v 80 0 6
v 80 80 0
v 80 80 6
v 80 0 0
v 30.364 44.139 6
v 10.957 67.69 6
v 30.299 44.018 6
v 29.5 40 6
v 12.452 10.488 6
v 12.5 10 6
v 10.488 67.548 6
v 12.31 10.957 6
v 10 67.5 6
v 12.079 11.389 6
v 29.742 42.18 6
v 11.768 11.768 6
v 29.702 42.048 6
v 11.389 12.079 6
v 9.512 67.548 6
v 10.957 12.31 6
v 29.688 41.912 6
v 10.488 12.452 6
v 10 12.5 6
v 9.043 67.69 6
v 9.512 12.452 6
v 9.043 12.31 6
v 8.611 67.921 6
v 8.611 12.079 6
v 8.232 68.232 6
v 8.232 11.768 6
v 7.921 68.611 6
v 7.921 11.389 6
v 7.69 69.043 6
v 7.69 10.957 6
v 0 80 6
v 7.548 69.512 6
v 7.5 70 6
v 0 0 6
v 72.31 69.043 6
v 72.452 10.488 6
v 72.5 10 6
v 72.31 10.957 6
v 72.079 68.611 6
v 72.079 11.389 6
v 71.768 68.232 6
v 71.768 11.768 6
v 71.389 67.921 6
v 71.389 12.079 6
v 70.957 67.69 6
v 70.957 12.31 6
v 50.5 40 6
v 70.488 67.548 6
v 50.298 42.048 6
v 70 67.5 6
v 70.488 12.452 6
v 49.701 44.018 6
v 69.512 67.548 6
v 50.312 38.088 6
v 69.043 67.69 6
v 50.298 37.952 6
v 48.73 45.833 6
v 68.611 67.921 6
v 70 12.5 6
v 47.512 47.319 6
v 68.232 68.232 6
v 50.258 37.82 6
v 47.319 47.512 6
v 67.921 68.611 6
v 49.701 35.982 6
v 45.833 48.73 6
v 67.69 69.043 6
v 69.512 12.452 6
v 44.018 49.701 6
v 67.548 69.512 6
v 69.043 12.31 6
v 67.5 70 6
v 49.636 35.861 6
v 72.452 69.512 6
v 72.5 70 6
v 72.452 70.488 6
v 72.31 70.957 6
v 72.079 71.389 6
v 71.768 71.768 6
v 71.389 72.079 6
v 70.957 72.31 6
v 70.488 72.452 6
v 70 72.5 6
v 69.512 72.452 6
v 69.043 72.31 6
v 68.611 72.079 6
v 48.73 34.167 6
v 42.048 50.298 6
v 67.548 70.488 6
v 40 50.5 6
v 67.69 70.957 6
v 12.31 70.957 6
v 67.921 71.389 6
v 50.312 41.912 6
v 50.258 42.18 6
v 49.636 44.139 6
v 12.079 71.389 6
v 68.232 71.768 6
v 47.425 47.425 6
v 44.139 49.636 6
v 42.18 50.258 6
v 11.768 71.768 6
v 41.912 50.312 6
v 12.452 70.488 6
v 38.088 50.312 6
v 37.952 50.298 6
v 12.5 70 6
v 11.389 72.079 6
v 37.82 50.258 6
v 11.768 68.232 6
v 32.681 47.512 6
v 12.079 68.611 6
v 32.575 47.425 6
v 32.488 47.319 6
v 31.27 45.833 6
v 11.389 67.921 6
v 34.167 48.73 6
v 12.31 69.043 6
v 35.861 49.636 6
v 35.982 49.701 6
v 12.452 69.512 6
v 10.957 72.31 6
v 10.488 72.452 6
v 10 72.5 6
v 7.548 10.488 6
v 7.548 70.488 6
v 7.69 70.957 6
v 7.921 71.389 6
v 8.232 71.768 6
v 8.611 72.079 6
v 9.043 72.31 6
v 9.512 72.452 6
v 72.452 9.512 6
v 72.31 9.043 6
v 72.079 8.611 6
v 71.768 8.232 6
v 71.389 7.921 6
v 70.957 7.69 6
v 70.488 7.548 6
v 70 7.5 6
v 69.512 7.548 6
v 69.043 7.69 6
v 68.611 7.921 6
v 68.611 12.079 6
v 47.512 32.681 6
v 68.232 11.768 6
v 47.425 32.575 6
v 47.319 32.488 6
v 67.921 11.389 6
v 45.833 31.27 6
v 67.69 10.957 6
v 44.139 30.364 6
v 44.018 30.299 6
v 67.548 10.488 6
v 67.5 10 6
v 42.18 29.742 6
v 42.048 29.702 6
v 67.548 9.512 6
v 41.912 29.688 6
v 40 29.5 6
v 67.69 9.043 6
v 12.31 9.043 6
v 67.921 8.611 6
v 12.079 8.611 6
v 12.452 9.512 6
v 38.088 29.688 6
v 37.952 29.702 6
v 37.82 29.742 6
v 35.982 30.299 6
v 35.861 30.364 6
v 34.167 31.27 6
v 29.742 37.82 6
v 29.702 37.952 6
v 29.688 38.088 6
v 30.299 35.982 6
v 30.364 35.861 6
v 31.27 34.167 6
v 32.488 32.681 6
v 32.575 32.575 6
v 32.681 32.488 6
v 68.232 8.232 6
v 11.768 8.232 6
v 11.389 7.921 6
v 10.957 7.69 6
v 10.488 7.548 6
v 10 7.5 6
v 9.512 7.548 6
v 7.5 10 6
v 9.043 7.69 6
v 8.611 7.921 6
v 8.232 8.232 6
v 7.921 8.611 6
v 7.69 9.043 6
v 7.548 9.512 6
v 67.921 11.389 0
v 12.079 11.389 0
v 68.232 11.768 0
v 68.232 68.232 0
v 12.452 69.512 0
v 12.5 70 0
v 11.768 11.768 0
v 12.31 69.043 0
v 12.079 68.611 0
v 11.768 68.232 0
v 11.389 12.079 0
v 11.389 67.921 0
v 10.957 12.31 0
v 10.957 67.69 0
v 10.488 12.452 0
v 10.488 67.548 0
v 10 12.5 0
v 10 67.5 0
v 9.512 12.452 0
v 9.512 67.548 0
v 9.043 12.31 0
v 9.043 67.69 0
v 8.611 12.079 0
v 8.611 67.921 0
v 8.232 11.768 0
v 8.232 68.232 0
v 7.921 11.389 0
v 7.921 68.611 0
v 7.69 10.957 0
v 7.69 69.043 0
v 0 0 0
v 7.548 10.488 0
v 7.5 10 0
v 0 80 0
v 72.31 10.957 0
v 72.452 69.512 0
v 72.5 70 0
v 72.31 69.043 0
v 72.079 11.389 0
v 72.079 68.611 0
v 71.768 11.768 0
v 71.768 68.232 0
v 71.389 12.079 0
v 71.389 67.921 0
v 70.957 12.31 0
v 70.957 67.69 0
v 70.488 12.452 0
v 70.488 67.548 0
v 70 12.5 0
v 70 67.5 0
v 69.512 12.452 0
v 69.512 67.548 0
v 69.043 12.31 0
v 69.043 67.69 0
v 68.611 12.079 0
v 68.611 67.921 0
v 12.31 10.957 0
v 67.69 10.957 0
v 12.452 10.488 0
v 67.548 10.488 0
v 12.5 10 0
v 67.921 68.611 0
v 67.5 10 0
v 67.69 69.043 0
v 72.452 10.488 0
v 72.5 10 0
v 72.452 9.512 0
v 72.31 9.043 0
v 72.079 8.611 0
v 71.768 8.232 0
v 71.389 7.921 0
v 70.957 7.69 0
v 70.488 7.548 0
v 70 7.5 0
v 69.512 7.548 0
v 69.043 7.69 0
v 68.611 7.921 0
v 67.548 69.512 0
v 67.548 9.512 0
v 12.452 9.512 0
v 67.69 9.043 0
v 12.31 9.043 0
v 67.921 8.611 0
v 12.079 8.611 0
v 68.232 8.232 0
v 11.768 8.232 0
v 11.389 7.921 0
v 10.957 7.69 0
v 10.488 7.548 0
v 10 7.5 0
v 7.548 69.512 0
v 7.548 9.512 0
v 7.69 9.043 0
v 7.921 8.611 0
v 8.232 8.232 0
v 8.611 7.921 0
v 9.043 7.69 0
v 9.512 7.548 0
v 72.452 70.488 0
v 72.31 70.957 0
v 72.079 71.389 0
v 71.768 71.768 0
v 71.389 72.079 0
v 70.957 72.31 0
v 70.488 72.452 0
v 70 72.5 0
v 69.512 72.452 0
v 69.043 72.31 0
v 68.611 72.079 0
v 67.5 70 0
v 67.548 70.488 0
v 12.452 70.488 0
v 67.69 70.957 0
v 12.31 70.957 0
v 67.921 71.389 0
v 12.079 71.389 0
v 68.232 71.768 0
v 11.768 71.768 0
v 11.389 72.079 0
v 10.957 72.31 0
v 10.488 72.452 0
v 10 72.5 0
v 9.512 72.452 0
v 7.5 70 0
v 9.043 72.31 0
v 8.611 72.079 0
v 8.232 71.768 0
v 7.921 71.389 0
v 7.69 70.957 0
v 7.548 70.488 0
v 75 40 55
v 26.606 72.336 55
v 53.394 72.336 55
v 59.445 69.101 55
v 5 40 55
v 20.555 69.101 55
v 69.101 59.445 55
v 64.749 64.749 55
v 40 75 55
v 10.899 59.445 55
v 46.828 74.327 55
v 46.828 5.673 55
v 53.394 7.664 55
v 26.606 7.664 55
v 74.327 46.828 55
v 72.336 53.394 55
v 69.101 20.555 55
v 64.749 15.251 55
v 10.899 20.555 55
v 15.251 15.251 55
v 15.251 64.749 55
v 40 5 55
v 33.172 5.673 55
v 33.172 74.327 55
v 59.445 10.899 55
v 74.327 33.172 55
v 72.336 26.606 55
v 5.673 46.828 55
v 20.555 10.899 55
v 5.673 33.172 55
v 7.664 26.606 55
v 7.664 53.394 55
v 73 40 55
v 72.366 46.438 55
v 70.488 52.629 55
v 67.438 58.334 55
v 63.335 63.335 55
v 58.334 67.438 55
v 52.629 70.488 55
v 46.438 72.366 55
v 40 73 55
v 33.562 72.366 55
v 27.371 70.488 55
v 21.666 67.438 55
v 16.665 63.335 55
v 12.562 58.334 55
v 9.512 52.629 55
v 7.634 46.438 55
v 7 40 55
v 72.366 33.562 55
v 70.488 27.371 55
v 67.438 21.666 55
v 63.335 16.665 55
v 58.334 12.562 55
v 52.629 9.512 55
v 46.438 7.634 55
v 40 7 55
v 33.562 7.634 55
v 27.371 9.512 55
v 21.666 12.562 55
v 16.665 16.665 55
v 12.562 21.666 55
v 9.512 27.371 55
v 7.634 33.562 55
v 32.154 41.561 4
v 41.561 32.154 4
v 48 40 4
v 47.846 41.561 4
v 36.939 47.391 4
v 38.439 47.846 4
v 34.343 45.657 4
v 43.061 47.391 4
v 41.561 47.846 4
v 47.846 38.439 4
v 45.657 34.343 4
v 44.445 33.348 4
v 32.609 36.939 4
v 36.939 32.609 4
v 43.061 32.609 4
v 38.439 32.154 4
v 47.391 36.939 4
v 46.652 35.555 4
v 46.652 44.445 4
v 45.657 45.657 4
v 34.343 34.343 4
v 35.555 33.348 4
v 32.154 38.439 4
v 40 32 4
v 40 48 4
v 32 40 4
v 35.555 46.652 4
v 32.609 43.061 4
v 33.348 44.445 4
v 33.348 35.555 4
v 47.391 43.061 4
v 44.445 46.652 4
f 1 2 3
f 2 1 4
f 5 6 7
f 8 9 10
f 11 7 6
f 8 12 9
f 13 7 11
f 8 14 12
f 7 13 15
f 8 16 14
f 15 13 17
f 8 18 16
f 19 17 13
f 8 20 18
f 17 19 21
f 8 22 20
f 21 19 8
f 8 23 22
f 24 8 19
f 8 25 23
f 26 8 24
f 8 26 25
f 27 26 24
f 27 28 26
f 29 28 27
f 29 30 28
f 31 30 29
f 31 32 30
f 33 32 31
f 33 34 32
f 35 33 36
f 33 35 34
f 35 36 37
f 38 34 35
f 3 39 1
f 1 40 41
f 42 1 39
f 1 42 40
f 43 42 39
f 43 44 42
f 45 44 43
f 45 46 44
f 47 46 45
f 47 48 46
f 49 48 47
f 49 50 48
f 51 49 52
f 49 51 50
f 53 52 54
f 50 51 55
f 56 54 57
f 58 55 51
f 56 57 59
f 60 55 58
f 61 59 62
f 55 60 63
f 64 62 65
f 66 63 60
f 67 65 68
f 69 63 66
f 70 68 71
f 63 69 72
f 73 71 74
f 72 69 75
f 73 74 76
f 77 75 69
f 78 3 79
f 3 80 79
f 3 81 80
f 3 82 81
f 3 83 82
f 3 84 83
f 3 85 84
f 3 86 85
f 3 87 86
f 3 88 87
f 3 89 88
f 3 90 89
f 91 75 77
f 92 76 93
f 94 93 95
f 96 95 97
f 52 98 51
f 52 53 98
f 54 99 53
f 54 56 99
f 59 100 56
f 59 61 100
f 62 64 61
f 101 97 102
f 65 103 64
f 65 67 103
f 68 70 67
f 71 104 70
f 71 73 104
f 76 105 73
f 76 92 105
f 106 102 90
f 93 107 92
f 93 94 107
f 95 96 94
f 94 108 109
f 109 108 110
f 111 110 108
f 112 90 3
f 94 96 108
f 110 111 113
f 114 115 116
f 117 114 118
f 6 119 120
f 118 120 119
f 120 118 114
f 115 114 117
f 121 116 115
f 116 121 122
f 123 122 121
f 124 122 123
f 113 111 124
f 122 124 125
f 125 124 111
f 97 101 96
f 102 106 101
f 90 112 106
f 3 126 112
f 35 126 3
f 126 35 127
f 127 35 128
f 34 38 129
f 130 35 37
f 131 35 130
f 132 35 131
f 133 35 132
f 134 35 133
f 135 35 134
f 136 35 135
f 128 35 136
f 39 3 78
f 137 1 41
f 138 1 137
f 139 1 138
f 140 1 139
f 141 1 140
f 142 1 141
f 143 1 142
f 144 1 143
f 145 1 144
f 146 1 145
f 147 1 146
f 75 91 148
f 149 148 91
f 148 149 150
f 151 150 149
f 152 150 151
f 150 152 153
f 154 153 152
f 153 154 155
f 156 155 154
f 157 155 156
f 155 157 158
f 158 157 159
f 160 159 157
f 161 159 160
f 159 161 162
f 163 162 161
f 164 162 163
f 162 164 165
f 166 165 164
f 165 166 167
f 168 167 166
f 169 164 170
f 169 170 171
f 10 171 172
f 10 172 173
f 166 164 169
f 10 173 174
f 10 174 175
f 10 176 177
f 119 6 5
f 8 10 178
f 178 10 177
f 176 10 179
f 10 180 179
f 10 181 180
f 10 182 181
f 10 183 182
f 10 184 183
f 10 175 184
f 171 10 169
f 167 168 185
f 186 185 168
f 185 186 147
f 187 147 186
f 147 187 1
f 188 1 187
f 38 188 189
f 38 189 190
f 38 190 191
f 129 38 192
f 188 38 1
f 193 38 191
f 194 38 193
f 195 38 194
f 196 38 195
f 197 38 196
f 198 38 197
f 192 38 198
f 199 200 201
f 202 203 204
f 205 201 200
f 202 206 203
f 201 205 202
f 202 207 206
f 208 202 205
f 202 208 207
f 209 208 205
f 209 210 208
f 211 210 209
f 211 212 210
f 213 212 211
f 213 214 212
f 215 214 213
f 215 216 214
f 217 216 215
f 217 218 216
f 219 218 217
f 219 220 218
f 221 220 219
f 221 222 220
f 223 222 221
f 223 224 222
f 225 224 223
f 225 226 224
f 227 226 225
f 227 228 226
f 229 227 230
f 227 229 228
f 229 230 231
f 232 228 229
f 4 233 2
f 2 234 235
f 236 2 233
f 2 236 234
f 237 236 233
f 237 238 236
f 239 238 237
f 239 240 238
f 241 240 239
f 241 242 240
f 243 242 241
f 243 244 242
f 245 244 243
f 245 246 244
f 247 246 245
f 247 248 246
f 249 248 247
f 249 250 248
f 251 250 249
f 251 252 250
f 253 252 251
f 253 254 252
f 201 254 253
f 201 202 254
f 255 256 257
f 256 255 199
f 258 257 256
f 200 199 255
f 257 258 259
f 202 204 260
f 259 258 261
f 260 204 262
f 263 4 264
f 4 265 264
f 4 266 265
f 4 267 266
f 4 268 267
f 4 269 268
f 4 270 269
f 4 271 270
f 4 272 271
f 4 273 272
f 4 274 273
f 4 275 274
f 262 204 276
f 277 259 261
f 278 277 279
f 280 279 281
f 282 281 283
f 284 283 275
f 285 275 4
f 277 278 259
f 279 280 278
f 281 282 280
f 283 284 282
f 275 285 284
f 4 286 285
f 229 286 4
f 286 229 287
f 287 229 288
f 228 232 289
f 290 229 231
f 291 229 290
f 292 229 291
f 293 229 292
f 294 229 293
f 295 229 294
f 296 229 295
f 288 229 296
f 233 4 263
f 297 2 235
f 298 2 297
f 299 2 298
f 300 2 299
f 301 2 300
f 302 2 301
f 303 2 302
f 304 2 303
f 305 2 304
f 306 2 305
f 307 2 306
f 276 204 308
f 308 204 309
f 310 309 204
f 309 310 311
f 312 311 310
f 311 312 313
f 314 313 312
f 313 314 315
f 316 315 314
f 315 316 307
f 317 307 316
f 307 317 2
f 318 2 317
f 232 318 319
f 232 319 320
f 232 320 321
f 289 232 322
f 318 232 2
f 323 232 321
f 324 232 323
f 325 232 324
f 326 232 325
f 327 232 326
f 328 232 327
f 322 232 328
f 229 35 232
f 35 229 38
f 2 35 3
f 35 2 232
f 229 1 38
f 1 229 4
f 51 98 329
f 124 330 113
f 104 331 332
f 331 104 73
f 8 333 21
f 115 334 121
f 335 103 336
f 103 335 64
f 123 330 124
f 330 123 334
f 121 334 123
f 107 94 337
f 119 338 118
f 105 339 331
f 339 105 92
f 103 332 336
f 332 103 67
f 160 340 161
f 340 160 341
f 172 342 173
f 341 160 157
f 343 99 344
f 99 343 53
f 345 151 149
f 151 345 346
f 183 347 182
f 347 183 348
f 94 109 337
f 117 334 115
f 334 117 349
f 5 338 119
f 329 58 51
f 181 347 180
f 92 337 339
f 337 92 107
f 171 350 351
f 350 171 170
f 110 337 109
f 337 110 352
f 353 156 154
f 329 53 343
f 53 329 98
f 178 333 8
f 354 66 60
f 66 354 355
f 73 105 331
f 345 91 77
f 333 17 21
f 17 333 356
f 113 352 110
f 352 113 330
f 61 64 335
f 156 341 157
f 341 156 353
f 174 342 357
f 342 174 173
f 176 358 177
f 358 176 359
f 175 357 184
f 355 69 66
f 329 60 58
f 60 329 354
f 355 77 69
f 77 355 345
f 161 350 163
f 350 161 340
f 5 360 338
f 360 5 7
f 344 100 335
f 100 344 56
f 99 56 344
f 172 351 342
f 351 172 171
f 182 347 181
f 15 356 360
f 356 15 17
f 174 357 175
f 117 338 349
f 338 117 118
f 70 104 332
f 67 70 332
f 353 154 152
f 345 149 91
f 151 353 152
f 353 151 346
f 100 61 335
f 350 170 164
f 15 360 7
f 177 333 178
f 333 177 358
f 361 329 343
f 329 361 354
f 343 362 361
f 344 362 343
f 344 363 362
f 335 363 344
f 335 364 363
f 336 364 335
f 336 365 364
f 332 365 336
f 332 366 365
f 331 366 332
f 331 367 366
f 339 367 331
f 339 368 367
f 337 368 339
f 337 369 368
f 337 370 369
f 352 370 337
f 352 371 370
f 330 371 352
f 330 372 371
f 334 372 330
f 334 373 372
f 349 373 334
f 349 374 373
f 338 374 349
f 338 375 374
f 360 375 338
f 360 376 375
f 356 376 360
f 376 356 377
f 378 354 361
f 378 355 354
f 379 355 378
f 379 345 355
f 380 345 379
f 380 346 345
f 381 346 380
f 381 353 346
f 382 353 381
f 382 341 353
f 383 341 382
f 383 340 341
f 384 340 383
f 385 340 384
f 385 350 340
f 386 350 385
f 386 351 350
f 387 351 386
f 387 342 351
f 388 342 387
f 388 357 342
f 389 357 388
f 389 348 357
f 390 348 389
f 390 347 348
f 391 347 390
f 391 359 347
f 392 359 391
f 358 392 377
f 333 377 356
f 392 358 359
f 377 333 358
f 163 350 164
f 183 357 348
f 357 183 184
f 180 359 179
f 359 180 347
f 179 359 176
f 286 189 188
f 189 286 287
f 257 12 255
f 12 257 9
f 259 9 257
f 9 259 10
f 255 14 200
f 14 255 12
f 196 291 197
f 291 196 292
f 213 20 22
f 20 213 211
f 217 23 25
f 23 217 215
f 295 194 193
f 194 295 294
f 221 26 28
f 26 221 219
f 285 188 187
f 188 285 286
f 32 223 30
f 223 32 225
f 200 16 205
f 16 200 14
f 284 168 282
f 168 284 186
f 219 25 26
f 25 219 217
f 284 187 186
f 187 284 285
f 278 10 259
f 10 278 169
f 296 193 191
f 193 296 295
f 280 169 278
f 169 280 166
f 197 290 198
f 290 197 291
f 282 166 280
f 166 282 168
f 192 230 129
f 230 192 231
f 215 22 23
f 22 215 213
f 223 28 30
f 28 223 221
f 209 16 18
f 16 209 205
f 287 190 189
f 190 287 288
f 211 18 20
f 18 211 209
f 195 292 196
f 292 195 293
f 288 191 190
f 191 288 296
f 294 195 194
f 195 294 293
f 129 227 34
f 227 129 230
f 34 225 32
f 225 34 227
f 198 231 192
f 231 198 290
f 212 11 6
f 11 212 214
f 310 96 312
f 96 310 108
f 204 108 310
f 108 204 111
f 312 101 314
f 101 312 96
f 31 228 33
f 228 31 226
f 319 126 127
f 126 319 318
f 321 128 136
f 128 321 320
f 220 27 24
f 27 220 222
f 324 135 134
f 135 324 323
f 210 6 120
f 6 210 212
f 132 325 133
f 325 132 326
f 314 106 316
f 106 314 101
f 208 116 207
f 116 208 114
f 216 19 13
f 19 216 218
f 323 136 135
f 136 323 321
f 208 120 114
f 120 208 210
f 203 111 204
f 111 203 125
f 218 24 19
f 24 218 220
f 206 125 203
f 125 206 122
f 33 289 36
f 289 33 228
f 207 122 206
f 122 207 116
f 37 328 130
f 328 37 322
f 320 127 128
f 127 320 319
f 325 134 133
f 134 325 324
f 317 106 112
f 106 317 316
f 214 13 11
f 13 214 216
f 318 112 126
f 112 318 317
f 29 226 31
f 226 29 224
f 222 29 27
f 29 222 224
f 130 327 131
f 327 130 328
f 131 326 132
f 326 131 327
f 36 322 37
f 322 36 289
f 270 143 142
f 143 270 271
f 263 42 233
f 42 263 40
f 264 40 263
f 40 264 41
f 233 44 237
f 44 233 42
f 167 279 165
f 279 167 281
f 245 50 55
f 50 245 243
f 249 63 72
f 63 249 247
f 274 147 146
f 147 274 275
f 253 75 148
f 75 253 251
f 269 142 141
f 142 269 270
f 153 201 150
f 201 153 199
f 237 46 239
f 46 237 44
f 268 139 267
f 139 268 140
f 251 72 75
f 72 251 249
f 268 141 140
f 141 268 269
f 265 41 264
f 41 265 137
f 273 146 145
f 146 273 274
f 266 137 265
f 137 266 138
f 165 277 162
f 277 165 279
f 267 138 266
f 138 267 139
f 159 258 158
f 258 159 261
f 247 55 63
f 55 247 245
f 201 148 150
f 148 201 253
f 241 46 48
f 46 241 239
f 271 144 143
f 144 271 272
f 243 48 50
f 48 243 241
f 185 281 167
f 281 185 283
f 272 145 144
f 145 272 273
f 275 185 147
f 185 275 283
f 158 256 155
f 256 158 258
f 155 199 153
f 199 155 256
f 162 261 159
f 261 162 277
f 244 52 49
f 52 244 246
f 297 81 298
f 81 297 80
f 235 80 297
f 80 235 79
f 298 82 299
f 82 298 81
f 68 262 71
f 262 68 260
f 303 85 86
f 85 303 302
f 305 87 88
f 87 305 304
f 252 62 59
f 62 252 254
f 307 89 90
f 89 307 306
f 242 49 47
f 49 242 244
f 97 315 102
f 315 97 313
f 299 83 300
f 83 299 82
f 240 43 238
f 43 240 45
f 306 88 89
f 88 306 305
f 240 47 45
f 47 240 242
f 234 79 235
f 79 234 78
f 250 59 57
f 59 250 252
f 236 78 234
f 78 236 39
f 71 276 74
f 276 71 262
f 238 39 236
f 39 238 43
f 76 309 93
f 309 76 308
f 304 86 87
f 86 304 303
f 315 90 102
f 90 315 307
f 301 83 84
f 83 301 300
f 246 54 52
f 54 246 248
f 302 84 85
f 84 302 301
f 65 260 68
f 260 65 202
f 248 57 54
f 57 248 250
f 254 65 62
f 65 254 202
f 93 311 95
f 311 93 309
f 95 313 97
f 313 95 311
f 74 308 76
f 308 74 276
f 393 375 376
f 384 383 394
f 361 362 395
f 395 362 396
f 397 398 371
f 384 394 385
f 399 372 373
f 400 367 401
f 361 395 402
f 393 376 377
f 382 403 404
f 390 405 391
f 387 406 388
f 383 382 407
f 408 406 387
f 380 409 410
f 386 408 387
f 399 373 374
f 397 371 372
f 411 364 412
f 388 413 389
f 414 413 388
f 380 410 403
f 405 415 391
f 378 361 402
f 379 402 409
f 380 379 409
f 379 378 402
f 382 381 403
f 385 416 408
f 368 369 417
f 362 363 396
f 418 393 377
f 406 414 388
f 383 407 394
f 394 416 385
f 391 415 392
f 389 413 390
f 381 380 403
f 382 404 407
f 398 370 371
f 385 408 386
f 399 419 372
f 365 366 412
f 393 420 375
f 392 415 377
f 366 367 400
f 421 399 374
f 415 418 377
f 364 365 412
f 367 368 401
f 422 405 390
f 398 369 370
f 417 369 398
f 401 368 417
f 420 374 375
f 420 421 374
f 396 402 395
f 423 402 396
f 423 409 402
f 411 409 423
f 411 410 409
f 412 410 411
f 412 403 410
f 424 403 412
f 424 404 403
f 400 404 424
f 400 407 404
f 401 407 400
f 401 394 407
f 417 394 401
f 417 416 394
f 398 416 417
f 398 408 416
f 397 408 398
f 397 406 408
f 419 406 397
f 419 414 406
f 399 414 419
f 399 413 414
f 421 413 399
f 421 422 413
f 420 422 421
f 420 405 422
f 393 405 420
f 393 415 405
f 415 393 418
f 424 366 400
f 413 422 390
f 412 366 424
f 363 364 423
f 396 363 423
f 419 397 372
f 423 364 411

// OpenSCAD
$fn = 32;

// ----------------------------------------------------------------------
// Hopper: flanged with square flange
// ----------------------------------------------------------------------

// --- parameters (mm) ---
fl = 80;                  // flange side, X and Y
fl_t = 6;                 // flange thickness
cone_h = 50;              // cone height above the flange
top_d = 70;               // cone mouth diameter
bot_d = 20;               // cone spout diameter
wall = 2;                 // cone wall thickness
hole_r = 2.5;             // flange hole radius
hole_in = 10;             // hole inset from the corners

bore_d = bot_d - 2 * wall;  // spout bore diameter
total_h = fl_t + cone_h - 1;  // overall height

difference() {
  union() {
    cube([fl, fl, fl_t]);
    translate([fl / 2, fl / 2, fl_t - 1])
      cylinder(h = cone_h, d1 = bot_d, d2 = top_d);
  }
  translate([fl / 2, fl / 2, fl_t - 2])
    cylinder(h = cone_h + 1, d1 = bore_d, d2 = top_d - 2 * wall);
  for (sx = [0, 1], sy = [0, 1])
    translate([sx ? fl - hole_in : hole_in,
               sy ? fl - hole_in : hole_in, -1])
      cylinder(r = hole_r, h = fl_t + 2);
}
